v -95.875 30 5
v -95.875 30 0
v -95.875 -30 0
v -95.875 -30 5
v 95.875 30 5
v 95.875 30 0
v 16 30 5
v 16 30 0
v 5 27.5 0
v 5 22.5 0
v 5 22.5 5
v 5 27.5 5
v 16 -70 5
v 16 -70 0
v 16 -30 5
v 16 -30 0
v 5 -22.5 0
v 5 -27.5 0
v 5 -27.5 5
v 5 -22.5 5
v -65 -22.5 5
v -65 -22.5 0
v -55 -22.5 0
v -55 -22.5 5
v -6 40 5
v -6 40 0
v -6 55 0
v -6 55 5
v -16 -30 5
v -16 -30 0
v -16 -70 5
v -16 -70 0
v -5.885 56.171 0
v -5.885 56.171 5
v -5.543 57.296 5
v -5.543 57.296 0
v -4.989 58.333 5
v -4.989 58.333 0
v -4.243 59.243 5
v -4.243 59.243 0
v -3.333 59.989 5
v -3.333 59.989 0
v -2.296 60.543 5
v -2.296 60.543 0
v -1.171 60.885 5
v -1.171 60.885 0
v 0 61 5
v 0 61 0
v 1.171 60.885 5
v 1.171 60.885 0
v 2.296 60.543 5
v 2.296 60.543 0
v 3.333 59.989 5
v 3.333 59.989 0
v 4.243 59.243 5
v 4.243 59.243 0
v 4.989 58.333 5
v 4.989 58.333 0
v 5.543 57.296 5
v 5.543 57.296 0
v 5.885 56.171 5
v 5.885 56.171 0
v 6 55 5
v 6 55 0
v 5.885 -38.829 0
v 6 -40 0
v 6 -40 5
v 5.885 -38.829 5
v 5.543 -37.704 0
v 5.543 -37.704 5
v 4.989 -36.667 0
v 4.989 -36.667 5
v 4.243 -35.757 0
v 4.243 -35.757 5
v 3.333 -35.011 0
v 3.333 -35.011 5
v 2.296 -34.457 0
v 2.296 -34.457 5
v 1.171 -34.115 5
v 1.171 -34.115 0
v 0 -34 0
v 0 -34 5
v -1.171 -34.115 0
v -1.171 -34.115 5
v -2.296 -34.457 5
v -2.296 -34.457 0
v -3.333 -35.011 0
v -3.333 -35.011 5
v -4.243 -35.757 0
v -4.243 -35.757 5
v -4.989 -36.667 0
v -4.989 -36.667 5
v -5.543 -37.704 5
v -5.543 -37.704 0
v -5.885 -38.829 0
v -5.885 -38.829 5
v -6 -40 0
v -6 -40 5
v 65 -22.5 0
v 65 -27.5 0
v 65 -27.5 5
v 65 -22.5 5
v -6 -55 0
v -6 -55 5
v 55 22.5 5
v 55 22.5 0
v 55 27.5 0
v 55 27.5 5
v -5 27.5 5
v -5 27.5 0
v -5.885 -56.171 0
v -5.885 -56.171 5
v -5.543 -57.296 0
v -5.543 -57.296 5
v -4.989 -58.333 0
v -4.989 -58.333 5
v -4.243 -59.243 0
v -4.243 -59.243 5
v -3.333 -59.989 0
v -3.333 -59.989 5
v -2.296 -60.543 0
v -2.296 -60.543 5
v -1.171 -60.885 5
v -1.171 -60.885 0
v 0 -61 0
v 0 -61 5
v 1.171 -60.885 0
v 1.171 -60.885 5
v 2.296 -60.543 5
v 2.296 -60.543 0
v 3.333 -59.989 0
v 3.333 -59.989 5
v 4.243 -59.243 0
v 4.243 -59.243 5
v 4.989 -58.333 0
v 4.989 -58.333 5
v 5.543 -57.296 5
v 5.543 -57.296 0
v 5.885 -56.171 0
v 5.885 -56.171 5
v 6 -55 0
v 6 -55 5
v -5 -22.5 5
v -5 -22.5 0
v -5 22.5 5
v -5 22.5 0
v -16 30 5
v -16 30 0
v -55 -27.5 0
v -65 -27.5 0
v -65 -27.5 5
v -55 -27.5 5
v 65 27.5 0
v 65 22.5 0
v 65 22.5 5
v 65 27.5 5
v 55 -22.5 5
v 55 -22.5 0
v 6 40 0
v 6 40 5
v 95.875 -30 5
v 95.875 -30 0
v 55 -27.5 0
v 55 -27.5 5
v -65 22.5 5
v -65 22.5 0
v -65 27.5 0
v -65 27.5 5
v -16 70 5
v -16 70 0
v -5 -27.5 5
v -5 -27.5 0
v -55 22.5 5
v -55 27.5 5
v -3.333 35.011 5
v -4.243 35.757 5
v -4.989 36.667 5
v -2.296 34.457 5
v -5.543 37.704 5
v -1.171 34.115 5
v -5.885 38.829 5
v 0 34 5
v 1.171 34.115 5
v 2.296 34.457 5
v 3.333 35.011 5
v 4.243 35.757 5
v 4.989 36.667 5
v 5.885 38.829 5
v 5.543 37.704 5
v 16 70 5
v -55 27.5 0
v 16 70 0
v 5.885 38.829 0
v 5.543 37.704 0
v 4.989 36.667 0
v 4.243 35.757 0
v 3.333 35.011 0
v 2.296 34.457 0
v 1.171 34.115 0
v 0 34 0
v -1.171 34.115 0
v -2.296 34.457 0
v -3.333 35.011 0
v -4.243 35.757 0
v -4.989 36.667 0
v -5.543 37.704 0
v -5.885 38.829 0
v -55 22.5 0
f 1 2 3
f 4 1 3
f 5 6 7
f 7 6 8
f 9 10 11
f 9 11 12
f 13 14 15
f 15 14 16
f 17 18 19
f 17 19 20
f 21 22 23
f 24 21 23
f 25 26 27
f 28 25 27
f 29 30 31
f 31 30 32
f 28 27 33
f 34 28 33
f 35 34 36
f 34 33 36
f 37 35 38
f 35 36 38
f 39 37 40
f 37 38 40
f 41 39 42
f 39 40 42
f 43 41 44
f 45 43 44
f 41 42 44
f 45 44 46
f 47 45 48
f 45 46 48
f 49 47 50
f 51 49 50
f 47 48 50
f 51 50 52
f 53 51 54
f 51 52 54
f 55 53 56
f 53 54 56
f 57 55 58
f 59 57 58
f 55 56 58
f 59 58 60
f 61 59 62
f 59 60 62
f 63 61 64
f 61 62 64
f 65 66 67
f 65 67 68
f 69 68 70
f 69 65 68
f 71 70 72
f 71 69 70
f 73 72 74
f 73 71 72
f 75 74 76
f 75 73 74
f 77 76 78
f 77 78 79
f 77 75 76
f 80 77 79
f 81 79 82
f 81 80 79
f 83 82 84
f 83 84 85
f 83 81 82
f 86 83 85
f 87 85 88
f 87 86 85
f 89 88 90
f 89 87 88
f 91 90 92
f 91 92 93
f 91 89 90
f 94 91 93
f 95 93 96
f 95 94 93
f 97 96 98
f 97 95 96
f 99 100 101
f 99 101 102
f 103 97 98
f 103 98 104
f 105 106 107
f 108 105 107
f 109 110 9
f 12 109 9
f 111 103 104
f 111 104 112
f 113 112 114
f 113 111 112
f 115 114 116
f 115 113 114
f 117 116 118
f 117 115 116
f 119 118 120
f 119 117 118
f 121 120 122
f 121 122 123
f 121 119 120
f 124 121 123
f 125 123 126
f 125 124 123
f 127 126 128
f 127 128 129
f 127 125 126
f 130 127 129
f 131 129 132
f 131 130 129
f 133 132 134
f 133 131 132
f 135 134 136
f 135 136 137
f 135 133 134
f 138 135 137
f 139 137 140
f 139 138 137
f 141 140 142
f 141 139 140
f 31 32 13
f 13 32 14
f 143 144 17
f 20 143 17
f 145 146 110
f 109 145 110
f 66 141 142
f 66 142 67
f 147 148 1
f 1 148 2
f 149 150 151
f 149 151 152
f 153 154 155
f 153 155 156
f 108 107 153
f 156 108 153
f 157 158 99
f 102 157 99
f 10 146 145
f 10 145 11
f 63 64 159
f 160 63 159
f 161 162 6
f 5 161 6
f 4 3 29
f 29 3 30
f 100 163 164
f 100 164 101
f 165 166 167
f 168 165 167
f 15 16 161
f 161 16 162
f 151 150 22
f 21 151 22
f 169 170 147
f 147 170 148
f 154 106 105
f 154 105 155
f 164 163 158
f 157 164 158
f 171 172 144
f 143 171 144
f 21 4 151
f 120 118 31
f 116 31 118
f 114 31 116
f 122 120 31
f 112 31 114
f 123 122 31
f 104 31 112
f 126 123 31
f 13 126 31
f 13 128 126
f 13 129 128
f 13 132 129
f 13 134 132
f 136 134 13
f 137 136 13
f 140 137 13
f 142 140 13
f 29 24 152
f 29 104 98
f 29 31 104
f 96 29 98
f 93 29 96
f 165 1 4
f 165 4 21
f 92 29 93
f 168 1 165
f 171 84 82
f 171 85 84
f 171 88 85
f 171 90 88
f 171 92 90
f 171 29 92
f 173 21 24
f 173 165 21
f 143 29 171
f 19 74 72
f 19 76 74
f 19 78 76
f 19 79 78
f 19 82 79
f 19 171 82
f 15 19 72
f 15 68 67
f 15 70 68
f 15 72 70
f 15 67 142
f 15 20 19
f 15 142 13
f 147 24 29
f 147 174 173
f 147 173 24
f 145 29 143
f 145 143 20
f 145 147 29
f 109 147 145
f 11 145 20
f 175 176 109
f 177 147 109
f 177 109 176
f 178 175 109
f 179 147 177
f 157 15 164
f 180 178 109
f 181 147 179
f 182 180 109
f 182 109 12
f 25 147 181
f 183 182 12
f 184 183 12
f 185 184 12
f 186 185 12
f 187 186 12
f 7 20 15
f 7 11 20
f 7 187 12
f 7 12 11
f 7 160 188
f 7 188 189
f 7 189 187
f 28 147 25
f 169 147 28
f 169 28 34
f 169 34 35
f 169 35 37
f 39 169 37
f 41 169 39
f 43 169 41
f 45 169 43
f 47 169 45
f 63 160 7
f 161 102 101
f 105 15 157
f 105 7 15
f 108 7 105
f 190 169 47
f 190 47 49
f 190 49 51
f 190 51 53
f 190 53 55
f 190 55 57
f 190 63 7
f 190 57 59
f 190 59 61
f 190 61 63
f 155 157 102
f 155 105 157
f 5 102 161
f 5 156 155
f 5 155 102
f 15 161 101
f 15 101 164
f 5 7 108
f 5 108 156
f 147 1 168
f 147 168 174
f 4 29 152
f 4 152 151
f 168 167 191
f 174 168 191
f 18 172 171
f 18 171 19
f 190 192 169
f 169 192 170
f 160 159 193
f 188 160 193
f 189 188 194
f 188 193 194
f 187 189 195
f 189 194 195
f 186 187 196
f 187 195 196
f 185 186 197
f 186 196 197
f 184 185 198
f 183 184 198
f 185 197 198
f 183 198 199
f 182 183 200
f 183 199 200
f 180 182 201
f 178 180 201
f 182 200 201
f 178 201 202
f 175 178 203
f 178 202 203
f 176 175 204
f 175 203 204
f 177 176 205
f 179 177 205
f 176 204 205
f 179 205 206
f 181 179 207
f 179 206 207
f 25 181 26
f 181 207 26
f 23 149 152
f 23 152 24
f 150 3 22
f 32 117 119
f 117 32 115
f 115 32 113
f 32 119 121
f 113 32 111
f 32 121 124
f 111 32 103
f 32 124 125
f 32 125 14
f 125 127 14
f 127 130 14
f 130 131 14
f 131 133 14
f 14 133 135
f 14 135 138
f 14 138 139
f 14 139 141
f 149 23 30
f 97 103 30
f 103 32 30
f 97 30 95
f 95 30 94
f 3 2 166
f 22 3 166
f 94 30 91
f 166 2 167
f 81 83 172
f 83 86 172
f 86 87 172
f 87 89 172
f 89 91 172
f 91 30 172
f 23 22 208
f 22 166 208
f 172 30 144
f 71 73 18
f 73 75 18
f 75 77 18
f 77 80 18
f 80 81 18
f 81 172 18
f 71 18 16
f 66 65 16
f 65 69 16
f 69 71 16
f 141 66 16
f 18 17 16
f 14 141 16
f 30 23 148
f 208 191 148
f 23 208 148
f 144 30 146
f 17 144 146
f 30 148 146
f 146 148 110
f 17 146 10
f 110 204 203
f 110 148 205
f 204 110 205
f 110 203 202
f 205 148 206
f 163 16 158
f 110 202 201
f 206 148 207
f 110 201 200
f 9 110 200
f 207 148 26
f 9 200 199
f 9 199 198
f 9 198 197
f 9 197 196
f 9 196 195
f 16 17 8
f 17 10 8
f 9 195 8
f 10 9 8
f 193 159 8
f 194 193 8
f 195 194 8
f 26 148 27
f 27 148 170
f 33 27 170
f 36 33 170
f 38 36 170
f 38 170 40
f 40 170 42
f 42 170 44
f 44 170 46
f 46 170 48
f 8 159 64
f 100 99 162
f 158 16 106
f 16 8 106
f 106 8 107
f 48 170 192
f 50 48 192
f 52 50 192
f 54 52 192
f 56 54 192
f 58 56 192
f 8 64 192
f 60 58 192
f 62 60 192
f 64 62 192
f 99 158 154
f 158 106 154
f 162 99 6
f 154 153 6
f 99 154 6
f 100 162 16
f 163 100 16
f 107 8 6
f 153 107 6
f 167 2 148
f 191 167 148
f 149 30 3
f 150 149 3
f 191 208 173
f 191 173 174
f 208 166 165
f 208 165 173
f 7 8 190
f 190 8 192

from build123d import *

# Parameters (mm, degrees)
SKETCH5_W           = 10
SKETCH5_H           = 5
BOSS_EXTRUDE2_DEPTH = 5


with BuildPart() as part:
    # Sketch5 → Boss-Extrude2 (new body)
    with BuildSketch(Plane.XY):
        Polygon((-16, -70), (16, -70), (16, -30), (95.875, -30), (95.875, 30), (16, 30), (16, 70), (-16, 70), (-16, 30), (-95.875, 30), (-95.875, -30), (-16, -30), align=None)
        with Locations((60, -25)):
            Rectangle(SKETCH5_W, SKETCH5_H, mode=Mode.SUBTRACT)
        with Locations((60, 25)):
            Rectangle(SKETCH5_W, SKETCH5_H, mode=Mode.SUBTRACT)
        with Locations((0, -25)):
            Rectangle(SKETCH5_W, SKETCH5_H, mode=Mode.SUBTRACT)
        with Locations((0, 25)):
            Rectangle(SKETCH5_W, SKETCH5_H, mode=Mode.SUBTRACT)
        with Locations((-60, 25)):
            Rectangle(SKETCH5_W, SKETCH5_H, mode=Mode.SUBTRACT)
        with Locations((-60, -25)):
            Rectangle(SKETCH5_W, SKETCH5_H, mode=Mode.SUBTRACT)
        with BuildLine():
            Line((6, 55), (6, 40))
            ThreePointArc((6, 40), (0, 34), (-6, 40))
            Line((-6, 40), (-6, 55))
            ThreePointArc((-6, 55), (0, 61), (6, 55))
        make_face(mode=Mode.SUBTRACT)
        with BuildLine():
            Line((-6, -40), (-6, -55))
            ThreePointArc((-6, -55), (0, -61), (6, -55))
            Line((6, -55), (6, -40))
            ThreePointArc((6, -40), (0, -34), (-6, -40))
        make_face(mode=Mode.SUBTRACT)
    extrude(amount=BOSS_EXTRUDE2_DEPTH)


solid = part.part
